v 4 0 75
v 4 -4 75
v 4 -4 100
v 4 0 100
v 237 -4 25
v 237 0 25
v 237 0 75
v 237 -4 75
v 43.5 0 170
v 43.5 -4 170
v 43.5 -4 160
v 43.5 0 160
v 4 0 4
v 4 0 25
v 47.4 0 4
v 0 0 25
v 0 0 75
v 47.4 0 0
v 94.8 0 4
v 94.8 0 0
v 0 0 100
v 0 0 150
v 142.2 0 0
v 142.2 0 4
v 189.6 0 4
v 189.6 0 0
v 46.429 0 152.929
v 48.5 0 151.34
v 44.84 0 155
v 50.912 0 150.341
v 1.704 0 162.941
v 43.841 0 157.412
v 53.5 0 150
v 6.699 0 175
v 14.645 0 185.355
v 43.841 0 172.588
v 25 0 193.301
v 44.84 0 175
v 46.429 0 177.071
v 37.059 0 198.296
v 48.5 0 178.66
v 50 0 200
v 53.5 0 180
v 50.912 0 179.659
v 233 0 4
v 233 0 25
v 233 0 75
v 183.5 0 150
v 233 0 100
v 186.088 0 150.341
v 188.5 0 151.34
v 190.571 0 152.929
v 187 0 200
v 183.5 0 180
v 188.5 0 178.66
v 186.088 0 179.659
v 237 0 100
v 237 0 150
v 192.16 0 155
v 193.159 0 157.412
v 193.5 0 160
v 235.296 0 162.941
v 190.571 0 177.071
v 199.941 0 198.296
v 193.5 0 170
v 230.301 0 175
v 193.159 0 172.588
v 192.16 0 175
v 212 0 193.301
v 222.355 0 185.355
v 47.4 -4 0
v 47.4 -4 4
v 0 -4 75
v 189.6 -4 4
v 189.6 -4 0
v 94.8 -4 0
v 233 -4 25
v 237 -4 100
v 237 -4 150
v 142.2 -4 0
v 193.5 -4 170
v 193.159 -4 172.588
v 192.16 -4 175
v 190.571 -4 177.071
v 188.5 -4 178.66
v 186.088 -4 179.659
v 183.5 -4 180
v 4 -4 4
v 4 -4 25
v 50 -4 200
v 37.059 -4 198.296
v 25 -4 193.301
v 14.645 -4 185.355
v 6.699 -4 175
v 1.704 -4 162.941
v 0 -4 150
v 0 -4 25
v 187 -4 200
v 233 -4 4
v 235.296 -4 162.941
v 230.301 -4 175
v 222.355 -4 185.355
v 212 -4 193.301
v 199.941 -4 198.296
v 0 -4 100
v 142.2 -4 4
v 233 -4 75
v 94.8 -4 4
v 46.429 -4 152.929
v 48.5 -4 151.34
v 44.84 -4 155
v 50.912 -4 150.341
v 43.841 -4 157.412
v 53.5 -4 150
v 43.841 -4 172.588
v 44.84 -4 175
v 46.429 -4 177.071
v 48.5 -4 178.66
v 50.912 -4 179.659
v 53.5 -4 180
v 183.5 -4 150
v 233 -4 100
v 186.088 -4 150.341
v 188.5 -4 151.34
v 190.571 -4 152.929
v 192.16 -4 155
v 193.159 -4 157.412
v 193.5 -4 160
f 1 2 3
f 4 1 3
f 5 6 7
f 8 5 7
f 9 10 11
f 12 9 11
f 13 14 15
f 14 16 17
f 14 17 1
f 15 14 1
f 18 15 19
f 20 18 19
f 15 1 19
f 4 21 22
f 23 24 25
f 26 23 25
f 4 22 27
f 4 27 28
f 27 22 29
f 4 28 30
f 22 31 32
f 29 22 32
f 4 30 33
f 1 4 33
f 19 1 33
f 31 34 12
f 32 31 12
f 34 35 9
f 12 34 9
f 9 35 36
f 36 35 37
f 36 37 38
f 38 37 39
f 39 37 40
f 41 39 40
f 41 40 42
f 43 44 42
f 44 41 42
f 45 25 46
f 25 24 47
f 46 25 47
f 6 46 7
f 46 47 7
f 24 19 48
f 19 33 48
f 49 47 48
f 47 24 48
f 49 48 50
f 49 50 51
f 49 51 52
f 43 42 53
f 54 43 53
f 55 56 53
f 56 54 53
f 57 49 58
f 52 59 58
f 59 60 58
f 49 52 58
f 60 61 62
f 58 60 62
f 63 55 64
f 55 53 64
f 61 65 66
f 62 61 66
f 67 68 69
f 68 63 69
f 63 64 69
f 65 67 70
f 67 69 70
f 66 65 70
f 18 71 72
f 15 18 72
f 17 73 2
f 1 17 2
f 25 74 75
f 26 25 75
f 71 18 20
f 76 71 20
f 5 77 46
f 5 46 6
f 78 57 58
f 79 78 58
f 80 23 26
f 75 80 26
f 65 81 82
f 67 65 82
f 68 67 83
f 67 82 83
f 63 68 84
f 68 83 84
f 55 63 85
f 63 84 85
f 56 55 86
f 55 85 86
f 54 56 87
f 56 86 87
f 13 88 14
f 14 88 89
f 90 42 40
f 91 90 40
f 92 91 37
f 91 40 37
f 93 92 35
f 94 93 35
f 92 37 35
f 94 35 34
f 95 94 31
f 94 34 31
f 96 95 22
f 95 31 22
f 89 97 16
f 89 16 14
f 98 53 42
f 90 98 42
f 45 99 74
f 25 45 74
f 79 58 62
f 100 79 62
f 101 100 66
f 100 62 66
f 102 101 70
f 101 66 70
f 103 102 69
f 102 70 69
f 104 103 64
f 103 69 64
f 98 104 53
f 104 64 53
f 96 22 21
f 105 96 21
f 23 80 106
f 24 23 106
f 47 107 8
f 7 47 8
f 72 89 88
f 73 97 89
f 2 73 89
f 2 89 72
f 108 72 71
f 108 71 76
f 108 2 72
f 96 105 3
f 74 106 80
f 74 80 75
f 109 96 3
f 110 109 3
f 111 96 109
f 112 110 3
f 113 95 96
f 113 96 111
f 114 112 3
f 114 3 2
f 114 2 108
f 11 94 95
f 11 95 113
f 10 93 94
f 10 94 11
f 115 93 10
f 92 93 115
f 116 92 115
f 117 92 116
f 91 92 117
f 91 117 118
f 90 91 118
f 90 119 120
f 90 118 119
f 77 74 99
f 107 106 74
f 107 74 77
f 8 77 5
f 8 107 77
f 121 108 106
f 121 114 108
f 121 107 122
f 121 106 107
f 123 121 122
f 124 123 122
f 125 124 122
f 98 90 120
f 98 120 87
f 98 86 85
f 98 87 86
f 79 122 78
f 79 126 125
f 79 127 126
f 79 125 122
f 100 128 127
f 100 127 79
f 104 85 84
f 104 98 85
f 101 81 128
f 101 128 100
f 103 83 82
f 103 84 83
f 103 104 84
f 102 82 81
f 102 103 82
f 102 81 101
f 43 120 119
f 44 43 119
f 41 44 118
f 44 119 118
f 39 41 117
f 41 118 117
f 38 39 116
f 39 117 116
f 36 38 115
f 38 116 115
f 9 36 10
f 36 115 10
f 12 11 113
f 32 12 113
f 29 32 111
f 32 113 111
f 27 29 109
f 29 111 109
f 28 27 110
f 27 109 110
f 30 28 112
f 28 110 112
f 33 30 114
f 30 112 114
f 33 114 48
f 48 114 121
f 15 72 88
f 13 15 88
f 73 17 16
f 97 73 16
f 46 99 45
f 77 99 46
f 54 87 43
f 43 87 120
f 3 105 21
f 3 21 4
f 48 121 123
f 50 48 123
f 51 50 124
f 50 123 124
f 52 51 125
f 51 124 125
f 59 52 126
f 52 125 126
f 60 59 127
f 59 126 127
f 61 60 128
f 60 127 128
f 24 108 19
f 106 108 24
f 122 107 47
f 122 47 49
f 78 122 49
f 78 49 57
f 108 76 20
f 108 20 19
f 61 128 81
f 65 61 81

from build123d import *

# Parameters (mm, degrees)
F1_DEPTH = 4
F2_W     = 47.4
F2_H     = 4
F2_W_2   = 4
F2_H_2   = 21
F2_H_3   = 25
F3_DEPTH = 4
F5_DEPTH = 4


with BuildPart() as f1:
    # F0 (on Front) → F1 (new body)
    with BuildSketch(Plane.XZ):
        with BuildLine():
            Line((0, 150), (0, 0))
            Line((0, 0), (237, 0))
            Line((237, 0), (237, 150))
            ThreePointArc((237, 150), (222.355339, 185.355339), (187, 200))
            Line((187, 200), (50, 200))
            ThreePointArc((50, 200), (14.644661, 185.355339), (0, 150))
        make_face()
    extrude(amount=F1_DEPTH)

    # F2 (on face) → F3 (cut, through all)
    with BuildSketch(Plane.XZ.offset(4)):
        Polygon((0, 4), (0, 0), (47.4, 0), (47.4, 4), (4, 4), align=None)
        Polygon((189.6, 4), (189.6, 0), (237, 0), (237, 4), (233, 4), align=None)
        with Locations((118.5, 2)):
            Rectangle(F2_W, F2_H)
        with Locations((2, 14.5)):
            Rectangle(F2_W_2, F2_H_2)
        with Locations((235, 14.5)):
            Rectangle(F2_W_2, F2_H_2)
        with Locations((2, 87.5)):
            Rectangle(F2_W_2, F2_H_3)
        with Locations((235, 87.5)):
            Rectangle(F2_W_2, F2_H_3)
    extrude(amount=-F3_DEPTH, mode=Mode.SUBTRACT)

    # F4 (on face) → F5 (cut, through all)
    with BuildSketch(Plane.XZ.offset(4)):
        with BuildLine():
            Line((183.5, 180), (53.5, 180))
            ThreePointArc((53.5, 180), (46.428932, 177.071068), (43.5, 170))
            Line((43.5, 170), (43.5, 160))
            ThreePointArc((43.5, 160), (46.428932, 152.928932), (53.5, 150))
            Line((53.5, 150), (183.5, 150))
            ThreePointArc((183.5, 150), (190.571068, 152.928932), (193.5, 160))
            Line((193.5, 160), (193.5, 170))
            ThreePointArc((193.5, 170), (190.571068, 177.071068), (183.5, 180))
        make_face()
    extrude(amount=-F5_DEPTH, mode=Mode.SUBTRACT)


solid = f1.part
